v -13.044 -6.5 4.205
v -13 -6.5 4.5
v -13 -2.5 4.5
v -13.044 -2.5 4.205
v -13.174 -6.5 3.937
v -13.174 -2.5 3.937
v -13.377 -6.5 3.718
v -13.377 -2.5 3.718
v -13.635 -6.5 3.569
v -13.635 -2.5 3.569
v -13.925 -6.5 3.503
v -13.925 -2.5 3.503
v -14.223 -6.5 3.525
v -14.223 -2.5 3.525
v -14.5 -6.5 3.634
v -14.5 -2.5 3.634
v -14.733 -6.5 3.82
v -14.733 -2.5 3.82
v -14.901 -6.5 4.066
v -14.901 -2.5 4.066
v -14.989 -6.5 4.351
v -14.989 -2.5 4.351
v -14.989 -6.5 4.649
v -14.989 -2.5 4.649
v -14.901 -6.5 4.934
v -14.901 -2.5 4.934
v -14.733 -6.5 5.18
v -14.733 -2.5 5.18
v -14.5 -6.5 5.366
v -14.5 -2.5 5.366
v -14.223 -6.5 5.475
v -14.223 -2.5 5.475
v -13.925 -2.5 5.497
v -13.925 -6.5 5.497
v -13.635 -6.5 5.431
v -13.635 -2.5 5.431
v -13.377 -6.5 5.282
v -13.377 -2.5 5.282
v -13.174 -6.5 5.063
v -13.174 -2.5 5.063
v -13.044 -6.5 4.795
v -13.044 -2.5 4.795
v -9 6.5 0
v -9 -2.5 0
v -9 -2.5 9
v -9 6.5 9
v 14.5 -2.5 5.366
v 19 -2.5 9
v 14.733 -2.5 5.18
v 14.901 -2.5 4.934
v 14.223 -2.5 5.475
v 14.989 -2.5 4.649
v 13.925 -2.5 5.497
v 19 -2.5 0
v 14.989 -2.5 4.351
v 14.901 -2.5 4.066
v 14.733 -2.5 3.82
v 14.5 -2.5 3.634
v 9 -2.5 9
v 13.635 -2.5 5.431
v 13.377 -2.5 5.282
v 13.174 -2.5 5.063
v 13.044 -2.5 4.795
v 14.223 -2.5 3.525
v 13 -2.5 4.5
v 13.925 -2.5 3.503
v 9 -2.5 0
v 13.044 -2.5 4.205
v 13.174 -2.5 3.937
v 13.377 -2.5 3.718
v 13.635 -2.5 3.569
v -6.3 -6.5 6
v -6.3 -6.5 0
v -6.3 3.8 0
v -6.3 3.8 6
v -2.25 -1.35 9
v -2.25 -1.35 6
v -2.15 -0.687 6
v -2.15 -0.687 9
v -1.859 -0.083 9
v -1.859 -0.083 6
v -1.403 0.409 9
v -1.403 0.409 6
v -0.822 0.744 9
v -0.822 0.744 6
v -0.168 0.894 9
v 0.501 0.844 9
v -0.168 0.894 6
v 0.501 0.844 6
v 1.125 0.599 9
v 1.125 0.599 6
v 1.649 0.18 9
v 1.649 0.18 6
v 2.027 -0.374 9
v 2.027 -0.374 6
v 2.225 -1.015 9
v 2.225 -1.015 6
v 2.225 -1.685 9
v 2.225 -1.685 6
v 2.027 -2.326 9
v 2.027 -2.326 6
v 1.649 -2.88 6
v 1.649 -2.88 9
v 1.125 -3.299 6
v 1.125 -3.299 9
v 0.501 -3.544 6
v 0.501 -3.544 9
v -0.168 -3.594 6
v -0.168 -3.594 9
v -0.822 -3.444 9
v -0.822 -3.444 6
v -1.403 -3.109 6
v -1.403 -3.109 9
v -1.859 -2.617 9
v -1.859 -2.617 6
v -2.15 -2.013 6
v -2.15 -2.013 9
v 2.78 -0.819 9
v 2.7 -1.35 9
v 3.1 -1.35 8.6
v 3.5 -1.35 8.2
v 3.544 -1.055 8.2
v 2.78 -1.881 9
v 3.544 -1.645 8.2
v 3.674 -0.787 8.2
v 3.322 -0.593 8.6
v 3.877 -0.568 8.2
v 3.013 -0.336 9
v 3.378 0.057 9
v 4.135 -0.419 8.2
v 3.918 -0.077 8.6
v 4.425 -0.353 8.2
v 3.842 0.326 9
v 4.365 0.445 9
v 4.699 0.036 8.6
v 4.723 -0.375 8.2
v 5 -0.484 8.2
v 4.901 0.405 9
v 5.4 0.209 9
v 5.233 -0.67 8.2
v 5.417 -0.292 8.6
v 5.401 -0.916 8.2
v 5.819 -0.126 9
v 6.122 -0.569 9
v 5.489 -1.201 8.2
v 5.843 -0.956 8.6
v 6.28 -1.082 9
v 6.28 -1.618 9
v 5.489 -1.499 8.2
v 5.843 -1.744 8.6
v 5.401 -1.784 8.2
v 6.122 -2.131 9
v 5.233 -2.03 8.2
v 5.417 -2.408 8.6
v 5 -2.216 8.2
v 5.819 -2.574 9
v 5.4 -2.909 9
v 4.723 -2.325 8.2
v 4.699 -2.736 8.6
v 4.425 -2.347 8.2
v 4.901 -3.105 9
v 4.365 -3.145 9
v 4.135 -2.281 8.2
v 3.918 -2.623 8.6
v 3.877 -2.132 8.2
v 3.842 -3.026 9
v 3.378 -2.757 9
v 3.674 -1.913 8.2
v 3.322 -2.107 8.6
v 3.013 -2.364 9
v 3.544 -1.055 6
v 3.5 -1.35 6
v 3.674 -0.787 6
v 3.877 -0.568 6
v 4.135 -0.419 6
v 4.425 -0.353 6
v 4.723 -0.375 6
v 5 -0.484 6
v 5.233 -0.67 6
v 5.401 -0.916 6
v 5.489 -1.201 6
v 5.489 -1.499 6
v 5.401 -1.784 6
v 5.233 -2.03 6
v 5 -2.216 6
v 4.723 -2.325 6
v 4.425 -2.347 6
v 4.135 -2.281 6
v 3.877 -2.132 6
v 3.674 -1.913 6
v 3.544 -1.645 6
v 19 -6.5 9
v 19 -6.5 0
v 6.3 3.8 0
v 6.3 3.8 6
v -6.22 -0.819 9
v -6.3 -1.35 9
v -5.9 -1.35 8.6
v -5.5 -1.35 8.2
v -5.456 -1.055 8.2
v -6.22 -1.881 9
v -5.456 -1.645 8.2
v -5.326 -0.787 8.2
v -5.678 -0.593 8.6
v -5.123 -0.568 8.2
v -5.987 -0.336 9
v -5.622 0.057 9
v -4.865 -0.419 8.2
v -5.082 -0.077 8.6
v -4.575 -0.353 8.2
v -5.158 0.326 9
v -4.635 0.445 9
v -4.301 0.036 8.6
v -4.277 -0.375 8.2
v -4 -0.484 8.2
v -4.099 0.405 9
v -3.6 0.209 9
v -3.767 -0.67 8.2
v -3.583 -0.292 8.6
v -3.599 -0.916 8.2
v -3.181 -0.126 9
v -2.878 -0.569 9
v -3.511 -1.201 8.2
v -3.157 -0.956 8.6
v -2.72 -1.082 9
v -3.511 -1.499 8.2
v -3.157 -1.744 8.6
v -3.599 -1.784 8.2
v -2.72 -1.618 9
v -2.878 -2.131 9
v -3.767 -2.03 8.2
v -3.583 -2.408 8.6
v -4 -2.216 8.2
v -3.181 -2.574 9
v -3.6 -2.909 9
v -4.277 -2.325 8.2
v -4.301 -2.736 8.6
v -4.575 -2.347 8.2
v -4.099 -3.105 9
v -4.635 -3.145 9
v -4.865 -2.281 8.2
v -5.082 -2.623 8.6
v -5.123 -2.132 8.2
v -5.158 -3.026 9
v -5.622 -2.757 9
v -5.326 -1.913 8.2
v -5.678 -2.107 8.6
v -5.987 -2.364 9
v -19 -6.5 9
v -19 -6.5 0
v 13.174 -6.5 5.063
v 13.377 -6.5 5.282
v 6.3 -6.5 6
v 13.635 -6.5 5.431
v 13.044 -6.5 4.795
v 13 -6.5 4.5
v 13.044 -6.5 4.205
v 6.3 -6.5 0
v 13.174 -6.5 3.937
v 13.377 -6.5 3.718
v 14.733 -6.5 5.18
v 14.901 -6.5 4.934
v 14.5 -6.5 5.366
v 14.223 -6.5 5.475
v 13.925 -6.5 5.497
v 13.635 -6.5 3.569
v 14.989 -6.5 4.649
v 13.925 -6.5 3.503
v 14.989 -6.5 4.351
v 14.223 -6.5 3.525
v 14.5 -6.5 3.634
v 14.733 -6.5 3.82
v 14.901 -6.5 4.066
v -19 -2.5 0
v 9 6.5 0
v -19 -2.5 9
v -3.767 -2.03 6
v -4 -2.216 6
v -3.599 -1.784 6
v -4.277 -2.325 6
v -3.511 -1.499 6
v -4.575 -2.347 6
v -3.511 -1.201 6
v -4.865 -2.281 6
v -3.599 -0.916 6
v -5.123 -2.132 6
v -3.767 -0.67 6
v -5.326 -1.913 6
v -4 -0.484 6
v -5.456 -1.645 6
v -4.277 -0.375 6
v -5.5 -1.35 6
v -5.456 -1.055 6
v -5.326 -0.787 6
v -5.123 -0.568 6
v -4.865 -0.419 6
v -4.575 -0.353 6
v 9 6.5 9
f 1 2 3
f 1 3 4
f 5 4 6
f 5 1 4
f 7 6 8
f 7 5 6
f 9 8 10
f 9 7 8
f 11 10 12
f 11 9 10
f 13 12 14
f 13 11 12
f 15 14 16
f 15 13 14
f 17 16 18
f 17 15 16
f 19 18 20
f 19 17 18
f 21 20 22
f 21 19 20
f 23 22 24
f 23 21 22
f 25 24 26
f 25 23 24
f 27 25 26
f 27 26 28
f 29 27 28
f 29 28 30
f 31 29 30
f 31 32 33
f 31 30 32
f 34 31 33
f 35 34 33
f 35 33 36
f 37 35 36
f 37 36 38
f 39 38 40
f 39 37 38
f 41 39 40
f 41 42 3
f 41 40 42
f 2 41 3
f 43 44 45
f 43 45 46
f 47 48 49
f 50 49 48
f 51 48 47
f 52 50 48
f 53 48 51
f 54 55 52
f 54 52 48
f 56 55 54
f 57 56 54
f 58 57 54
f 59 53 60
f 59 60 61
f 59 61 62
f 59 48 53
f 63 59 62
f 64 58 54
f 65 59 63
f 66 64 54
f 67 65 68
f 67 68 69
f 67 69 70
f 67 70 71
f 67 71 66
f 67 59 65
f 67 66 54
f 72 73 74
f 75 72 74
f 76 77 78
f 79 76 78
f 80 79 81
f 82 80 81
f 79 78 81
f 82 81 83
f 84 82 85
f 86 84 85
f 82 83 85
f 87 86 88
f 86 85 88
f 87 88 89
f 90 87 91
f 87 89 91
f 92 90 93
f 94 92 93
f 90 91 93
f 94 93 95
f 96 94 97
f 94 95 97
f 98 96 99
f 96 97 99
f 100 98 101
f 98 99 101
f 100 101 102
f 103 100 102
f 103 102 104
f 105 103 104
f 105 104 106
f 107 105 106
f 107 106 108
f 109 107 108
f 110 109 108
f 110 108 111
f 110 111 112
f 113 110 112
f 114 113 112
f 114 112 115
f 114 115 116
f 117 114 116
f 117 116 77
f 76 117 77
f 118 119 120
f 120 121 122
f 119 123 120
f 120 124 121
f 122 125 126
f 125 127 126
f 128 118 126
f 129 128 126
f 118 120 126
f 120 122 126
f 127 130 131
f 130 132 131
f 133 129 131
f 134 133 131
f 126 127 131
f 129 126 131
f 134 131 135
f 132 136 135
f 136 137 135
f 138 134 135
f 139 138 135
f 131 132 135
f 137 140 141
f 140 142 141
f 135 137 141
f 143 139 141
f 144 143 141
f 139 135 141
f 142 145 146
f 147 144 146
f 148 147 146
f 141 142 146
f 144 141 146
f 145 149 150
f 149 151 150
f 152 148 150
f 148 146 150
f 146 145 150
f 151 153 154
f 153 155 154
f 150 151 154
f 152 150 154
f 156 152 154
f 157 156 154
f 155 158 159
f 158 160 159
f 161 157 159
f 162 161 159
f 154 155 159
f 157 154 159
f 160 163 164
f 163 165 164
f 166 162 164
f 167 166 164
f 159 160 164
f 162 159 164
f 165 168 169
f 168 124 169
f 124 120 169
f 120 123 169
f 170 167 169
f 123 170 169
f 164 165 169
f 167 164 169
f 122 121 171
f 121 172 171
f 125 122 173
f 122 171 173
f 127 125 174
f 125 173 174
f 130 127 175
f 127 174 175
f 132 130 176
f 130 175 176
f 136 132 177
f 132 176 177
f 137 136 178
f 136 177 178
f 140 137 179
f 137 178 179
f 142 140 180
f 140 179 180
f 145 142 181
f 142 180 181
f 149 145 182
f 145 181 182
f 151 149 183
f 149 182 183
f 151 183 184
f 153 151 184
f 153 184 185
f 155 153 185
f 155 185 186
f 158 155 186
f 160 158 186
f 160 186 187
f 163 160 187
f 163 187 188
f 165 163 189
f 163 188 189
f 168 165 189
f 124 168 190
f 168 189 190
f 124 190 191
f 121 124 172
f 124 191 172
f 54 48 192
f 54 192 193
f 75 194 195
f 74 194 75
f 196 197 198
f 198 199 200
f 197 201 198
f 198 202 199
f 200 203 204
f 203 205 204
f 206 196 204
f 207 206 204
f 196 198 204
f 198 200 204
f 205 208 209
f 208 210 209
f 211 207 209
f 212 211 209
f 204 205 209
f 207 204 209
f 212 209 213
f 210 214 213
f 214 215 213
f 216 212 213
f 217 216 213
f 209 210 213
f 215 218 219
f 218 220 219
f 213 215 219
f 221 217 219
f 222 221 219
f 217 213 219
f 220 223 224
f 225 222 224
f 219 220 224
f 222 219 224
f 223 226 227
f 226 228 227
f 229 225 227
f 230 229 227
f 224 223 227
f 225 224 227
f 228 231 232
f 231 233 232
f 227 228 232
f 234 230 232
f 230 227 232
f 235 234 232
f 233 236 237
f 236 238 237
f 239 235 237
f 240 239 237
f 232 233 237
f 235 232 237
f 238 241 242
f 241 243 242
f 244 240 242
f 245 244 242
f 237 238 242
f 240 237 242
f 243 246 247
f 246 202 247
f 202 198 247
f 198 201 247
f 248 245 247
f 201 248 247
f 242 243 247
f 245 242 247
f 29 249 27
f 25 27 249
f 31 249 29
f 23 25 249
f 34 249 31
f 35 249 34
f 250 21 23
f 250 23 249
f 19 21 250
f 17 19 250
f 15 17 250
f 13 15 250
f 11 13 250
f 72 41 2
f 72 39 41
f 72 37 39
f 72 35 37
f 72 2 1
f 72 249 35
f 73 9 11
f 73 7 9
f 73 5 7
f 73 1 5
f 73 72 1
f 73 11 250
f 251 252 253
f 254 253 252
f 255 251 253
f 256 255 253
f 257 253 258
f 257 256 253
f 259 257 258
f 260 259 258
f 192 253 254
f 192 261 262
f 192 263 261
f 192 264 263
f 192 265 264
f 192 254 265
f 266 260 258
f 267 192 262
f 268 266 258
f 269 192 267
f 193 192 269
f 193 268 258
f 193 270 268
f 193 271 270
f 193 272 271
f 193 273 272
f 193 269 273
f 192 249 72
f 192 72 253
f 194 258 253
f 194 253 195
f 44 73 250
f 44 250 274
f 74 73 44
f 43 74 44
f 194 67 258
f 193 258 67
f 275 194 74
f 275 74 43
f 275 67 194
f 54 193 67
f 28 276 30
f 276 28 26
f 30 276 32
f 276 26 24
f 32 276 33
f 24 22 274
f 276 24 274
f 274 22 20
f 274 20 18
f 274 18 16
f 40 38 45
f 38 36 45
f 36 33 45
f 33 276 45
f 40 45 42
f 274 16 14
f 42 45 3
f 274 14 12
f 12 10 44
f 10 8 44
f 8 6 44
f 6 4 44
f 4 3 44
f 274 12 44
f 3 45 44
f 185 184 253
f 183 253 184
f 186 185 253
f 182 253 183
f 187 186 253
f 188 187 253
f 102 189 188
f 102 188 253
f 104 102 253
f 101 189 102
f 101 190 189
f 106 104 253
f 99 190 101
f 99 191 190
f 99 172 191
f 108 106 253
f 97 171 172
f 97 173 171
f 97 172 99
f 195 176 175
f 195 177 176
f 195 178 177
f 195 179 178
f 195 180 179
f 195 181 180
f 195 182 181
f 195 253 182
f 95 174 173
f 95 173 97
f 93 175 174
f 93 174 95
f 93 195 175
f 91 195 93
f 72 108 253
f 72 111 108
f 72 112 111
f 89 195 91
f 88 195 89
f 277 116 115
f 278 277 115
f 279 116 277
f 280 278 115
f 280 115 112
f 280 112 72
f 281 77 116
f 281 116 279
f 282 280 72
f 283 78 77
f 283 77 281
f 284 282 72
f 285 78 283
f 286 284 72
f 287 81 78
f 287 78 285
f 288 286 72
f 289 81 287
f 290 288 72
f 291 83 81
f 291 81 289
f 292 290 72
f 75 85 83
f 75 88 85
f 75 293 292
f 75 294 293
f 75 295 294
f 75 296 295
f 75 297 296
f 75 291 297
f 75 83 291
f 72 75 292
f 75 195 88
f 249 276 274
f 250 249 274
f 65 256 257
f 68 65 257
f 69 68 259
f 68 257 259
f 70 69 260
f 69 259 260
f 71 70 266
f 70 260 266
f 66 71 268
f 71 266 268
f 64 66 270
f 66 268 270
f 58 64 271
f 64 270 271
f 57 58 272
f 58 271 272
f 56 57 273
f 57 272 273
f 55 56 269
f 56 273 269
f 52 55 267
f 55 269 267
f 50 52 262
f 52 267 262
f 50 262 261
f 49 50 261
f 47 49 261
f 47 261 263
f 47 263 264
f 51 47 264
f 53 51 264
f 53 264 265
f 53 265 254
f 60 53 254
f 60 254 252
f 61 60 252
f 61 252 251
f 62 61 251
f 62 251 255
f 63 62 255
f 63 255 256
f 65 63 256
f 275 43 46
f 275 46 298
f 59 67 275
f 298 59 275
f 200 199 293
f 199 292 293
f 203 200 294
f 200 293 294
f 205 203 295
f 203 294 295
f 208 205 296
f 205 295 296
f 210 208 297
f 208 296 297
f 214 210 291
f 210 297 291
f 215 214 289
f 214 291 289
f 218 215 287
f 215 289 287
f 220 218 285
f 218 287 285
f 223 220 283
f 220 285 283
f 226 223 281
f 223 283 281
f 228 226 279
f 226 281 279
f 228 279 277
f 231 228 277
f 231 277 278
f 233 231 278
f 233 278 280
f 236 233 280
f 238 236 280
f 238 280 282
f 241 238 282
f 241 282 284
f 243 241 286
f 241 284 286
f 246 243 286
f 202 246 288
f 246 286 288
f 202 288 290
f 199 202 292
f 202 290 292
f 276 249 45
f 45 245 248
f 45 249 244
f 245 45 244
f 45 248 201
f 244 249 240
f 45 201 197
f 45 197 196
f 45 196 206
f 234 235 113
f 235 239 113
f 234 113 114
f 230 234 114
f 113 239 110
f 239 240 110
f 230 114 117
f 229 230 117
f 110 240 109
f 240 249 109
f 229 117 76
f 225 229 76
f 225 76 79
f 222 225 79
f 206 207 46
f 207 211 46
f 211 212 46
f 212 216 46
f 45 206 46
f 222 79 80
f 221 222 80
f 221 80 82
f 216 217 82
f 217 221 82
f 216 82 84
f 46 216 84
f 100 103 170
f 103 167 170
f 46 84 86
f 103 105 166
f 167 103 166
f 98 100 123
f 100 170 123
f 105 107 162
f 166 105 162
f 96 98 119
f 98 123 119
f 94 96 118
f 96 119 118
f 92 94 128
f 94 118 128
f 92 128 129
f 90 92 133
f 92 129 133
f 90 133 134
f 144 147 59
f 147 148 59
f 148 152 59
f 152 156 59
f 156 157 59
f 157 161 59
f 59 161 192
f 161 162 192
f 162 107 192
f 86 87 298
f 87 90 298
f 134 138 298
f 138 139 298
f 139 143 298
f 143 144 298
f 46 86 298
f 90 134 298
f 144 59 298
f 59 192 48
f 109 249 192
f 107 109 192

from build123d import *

# Parameters (mm, degrees)
SKETCH3_W                                            = 18
SKETCH3_H                                            = 13
BOSS_EXTRUDE1_DEPTH                                  = 9
SKETCH9_W                                            = 12.6
SKETCH9_H                                            = 10.3
CUT_EXTRUDE2_DEPTH                                   = 6
SKETCH10_R                                           = 2.25
CUT_EXTRUDE3_DEPTH                                   = 13.619429464
CSK_FOR_M1_6_COUNTERSUNK_FLAT_HEAD_SCREW_D           = 2
CSK_FOR_M1_6_COUNTERSUNK_FLAT_HEAD_SCREW_CSINK_D     = 3.6
CSK_FOR_M1_6_COUNTERSUNK_FLAT_HEAD_SCREW_CSINK_ANGLE = 90
SKETCH14_W                                           = 9
SKETCH14_H                                           = 4
BOSS_EXTRUDE2_DEPTH                                  = 10
M1_6_CLEARANCE_HOLE1_D                               = 2


with BuildPart() as part:
    # Sketch3 → Boss-Extrude1 (new body)
    with BuildSketch(Plane.XY):
        Rectangle(SKETCH3_W, SKETCH3_H)
    extrude(amount=BOSS_EXTRUDE1_DEPTH)

    # Sketch9 → Cut-Extrude2 (cut)
    with BuildSketch(Plane(origin=(0, 0, 0), x_dir=(-1, 0, 0), z_dir=(0, 0, -1))):
        with Locations((0, -1.35)):
            Rectangle(SKETCH9_W, SKETCH9_H)
    extrude(amount=-CUT_EXTRUDE2_DEPTH, mode=Mode.SUBTRACT)

    # Sketch10 → Cut-Extrude3 (cut, through all)
    with BuildSketch(Plane(origin=(0, 0, 6), x_dir=(-1, 0, 0), z_dir=(0, 0, -1))):
        with Locations((0, -1.35)):
            Circle(SKETCH10_R)
    extrude(amount=-CUT_EXTRUDE3_DEPTH, mode=Mode.SUBTRACT)

    # CSK for M1.6 Countersunk Flat Head Screw2 (through all)
    with Locations(Plane.XY.offset(9)):
        with Locations((-4.5, -1.35), (4.5, -1.35)):
            CounterSinkHole(CSK_FOR_M1_6_COUNTERSUNK_FLAT_HEAD_SCREW_D / 2, CSK_FOR_M1_6_COUNTERSUNK_FLAT_HEAD_SCREW_CSINK_D / 2, counter_sink_angle=CSK_FOR_M1_6_COUNTERSUNK_FLAT_HEAD_SCREW_CSINK_ANGLE)

    # Sketch14 → Boss-Extrude2 (add)
    with BuildSketch(Plane(origin=(9, 0, 0), x_dir=(0, 0, -1), z_dir=(1, 0, 0))):
        with Locations((-4.5, -4.5)):
            Rectangle(SKETCH14_W, SKETCH14_H)
    boss_extrude2 = extrude(amount=BOSS_EXTRUDE2_DEPTH)

    # M1.6 Clearance Hole1 (through all)
    with Locations(Plane(origin=(0, -2.5, 0), x_dir=(1, 0, 0), z_dir=(0, 1, 0))):
        with Locations((14, -4.5)):
            m1_6_clearance_hole1 = Hole(M1_6_CLEARANCE_HOLE1_D / 2)

    # Mirror2: Boss-Extrude2, M1.6 Clearance Hole1 across plane
    add(boss_extrude2.mirror(Plane(origin=(0, 0, 0), x_dir=(0, 0, 1), z_dir=(1, 0, 0))))
    add(m1_6_clearance_hole1.mirror(Plane(origin=(0, 0, 0), x_dir=(0, 0, 1), z_dir=(1, 0, 0))), mode=Mode.SUBTRACT)


solid = part.part
